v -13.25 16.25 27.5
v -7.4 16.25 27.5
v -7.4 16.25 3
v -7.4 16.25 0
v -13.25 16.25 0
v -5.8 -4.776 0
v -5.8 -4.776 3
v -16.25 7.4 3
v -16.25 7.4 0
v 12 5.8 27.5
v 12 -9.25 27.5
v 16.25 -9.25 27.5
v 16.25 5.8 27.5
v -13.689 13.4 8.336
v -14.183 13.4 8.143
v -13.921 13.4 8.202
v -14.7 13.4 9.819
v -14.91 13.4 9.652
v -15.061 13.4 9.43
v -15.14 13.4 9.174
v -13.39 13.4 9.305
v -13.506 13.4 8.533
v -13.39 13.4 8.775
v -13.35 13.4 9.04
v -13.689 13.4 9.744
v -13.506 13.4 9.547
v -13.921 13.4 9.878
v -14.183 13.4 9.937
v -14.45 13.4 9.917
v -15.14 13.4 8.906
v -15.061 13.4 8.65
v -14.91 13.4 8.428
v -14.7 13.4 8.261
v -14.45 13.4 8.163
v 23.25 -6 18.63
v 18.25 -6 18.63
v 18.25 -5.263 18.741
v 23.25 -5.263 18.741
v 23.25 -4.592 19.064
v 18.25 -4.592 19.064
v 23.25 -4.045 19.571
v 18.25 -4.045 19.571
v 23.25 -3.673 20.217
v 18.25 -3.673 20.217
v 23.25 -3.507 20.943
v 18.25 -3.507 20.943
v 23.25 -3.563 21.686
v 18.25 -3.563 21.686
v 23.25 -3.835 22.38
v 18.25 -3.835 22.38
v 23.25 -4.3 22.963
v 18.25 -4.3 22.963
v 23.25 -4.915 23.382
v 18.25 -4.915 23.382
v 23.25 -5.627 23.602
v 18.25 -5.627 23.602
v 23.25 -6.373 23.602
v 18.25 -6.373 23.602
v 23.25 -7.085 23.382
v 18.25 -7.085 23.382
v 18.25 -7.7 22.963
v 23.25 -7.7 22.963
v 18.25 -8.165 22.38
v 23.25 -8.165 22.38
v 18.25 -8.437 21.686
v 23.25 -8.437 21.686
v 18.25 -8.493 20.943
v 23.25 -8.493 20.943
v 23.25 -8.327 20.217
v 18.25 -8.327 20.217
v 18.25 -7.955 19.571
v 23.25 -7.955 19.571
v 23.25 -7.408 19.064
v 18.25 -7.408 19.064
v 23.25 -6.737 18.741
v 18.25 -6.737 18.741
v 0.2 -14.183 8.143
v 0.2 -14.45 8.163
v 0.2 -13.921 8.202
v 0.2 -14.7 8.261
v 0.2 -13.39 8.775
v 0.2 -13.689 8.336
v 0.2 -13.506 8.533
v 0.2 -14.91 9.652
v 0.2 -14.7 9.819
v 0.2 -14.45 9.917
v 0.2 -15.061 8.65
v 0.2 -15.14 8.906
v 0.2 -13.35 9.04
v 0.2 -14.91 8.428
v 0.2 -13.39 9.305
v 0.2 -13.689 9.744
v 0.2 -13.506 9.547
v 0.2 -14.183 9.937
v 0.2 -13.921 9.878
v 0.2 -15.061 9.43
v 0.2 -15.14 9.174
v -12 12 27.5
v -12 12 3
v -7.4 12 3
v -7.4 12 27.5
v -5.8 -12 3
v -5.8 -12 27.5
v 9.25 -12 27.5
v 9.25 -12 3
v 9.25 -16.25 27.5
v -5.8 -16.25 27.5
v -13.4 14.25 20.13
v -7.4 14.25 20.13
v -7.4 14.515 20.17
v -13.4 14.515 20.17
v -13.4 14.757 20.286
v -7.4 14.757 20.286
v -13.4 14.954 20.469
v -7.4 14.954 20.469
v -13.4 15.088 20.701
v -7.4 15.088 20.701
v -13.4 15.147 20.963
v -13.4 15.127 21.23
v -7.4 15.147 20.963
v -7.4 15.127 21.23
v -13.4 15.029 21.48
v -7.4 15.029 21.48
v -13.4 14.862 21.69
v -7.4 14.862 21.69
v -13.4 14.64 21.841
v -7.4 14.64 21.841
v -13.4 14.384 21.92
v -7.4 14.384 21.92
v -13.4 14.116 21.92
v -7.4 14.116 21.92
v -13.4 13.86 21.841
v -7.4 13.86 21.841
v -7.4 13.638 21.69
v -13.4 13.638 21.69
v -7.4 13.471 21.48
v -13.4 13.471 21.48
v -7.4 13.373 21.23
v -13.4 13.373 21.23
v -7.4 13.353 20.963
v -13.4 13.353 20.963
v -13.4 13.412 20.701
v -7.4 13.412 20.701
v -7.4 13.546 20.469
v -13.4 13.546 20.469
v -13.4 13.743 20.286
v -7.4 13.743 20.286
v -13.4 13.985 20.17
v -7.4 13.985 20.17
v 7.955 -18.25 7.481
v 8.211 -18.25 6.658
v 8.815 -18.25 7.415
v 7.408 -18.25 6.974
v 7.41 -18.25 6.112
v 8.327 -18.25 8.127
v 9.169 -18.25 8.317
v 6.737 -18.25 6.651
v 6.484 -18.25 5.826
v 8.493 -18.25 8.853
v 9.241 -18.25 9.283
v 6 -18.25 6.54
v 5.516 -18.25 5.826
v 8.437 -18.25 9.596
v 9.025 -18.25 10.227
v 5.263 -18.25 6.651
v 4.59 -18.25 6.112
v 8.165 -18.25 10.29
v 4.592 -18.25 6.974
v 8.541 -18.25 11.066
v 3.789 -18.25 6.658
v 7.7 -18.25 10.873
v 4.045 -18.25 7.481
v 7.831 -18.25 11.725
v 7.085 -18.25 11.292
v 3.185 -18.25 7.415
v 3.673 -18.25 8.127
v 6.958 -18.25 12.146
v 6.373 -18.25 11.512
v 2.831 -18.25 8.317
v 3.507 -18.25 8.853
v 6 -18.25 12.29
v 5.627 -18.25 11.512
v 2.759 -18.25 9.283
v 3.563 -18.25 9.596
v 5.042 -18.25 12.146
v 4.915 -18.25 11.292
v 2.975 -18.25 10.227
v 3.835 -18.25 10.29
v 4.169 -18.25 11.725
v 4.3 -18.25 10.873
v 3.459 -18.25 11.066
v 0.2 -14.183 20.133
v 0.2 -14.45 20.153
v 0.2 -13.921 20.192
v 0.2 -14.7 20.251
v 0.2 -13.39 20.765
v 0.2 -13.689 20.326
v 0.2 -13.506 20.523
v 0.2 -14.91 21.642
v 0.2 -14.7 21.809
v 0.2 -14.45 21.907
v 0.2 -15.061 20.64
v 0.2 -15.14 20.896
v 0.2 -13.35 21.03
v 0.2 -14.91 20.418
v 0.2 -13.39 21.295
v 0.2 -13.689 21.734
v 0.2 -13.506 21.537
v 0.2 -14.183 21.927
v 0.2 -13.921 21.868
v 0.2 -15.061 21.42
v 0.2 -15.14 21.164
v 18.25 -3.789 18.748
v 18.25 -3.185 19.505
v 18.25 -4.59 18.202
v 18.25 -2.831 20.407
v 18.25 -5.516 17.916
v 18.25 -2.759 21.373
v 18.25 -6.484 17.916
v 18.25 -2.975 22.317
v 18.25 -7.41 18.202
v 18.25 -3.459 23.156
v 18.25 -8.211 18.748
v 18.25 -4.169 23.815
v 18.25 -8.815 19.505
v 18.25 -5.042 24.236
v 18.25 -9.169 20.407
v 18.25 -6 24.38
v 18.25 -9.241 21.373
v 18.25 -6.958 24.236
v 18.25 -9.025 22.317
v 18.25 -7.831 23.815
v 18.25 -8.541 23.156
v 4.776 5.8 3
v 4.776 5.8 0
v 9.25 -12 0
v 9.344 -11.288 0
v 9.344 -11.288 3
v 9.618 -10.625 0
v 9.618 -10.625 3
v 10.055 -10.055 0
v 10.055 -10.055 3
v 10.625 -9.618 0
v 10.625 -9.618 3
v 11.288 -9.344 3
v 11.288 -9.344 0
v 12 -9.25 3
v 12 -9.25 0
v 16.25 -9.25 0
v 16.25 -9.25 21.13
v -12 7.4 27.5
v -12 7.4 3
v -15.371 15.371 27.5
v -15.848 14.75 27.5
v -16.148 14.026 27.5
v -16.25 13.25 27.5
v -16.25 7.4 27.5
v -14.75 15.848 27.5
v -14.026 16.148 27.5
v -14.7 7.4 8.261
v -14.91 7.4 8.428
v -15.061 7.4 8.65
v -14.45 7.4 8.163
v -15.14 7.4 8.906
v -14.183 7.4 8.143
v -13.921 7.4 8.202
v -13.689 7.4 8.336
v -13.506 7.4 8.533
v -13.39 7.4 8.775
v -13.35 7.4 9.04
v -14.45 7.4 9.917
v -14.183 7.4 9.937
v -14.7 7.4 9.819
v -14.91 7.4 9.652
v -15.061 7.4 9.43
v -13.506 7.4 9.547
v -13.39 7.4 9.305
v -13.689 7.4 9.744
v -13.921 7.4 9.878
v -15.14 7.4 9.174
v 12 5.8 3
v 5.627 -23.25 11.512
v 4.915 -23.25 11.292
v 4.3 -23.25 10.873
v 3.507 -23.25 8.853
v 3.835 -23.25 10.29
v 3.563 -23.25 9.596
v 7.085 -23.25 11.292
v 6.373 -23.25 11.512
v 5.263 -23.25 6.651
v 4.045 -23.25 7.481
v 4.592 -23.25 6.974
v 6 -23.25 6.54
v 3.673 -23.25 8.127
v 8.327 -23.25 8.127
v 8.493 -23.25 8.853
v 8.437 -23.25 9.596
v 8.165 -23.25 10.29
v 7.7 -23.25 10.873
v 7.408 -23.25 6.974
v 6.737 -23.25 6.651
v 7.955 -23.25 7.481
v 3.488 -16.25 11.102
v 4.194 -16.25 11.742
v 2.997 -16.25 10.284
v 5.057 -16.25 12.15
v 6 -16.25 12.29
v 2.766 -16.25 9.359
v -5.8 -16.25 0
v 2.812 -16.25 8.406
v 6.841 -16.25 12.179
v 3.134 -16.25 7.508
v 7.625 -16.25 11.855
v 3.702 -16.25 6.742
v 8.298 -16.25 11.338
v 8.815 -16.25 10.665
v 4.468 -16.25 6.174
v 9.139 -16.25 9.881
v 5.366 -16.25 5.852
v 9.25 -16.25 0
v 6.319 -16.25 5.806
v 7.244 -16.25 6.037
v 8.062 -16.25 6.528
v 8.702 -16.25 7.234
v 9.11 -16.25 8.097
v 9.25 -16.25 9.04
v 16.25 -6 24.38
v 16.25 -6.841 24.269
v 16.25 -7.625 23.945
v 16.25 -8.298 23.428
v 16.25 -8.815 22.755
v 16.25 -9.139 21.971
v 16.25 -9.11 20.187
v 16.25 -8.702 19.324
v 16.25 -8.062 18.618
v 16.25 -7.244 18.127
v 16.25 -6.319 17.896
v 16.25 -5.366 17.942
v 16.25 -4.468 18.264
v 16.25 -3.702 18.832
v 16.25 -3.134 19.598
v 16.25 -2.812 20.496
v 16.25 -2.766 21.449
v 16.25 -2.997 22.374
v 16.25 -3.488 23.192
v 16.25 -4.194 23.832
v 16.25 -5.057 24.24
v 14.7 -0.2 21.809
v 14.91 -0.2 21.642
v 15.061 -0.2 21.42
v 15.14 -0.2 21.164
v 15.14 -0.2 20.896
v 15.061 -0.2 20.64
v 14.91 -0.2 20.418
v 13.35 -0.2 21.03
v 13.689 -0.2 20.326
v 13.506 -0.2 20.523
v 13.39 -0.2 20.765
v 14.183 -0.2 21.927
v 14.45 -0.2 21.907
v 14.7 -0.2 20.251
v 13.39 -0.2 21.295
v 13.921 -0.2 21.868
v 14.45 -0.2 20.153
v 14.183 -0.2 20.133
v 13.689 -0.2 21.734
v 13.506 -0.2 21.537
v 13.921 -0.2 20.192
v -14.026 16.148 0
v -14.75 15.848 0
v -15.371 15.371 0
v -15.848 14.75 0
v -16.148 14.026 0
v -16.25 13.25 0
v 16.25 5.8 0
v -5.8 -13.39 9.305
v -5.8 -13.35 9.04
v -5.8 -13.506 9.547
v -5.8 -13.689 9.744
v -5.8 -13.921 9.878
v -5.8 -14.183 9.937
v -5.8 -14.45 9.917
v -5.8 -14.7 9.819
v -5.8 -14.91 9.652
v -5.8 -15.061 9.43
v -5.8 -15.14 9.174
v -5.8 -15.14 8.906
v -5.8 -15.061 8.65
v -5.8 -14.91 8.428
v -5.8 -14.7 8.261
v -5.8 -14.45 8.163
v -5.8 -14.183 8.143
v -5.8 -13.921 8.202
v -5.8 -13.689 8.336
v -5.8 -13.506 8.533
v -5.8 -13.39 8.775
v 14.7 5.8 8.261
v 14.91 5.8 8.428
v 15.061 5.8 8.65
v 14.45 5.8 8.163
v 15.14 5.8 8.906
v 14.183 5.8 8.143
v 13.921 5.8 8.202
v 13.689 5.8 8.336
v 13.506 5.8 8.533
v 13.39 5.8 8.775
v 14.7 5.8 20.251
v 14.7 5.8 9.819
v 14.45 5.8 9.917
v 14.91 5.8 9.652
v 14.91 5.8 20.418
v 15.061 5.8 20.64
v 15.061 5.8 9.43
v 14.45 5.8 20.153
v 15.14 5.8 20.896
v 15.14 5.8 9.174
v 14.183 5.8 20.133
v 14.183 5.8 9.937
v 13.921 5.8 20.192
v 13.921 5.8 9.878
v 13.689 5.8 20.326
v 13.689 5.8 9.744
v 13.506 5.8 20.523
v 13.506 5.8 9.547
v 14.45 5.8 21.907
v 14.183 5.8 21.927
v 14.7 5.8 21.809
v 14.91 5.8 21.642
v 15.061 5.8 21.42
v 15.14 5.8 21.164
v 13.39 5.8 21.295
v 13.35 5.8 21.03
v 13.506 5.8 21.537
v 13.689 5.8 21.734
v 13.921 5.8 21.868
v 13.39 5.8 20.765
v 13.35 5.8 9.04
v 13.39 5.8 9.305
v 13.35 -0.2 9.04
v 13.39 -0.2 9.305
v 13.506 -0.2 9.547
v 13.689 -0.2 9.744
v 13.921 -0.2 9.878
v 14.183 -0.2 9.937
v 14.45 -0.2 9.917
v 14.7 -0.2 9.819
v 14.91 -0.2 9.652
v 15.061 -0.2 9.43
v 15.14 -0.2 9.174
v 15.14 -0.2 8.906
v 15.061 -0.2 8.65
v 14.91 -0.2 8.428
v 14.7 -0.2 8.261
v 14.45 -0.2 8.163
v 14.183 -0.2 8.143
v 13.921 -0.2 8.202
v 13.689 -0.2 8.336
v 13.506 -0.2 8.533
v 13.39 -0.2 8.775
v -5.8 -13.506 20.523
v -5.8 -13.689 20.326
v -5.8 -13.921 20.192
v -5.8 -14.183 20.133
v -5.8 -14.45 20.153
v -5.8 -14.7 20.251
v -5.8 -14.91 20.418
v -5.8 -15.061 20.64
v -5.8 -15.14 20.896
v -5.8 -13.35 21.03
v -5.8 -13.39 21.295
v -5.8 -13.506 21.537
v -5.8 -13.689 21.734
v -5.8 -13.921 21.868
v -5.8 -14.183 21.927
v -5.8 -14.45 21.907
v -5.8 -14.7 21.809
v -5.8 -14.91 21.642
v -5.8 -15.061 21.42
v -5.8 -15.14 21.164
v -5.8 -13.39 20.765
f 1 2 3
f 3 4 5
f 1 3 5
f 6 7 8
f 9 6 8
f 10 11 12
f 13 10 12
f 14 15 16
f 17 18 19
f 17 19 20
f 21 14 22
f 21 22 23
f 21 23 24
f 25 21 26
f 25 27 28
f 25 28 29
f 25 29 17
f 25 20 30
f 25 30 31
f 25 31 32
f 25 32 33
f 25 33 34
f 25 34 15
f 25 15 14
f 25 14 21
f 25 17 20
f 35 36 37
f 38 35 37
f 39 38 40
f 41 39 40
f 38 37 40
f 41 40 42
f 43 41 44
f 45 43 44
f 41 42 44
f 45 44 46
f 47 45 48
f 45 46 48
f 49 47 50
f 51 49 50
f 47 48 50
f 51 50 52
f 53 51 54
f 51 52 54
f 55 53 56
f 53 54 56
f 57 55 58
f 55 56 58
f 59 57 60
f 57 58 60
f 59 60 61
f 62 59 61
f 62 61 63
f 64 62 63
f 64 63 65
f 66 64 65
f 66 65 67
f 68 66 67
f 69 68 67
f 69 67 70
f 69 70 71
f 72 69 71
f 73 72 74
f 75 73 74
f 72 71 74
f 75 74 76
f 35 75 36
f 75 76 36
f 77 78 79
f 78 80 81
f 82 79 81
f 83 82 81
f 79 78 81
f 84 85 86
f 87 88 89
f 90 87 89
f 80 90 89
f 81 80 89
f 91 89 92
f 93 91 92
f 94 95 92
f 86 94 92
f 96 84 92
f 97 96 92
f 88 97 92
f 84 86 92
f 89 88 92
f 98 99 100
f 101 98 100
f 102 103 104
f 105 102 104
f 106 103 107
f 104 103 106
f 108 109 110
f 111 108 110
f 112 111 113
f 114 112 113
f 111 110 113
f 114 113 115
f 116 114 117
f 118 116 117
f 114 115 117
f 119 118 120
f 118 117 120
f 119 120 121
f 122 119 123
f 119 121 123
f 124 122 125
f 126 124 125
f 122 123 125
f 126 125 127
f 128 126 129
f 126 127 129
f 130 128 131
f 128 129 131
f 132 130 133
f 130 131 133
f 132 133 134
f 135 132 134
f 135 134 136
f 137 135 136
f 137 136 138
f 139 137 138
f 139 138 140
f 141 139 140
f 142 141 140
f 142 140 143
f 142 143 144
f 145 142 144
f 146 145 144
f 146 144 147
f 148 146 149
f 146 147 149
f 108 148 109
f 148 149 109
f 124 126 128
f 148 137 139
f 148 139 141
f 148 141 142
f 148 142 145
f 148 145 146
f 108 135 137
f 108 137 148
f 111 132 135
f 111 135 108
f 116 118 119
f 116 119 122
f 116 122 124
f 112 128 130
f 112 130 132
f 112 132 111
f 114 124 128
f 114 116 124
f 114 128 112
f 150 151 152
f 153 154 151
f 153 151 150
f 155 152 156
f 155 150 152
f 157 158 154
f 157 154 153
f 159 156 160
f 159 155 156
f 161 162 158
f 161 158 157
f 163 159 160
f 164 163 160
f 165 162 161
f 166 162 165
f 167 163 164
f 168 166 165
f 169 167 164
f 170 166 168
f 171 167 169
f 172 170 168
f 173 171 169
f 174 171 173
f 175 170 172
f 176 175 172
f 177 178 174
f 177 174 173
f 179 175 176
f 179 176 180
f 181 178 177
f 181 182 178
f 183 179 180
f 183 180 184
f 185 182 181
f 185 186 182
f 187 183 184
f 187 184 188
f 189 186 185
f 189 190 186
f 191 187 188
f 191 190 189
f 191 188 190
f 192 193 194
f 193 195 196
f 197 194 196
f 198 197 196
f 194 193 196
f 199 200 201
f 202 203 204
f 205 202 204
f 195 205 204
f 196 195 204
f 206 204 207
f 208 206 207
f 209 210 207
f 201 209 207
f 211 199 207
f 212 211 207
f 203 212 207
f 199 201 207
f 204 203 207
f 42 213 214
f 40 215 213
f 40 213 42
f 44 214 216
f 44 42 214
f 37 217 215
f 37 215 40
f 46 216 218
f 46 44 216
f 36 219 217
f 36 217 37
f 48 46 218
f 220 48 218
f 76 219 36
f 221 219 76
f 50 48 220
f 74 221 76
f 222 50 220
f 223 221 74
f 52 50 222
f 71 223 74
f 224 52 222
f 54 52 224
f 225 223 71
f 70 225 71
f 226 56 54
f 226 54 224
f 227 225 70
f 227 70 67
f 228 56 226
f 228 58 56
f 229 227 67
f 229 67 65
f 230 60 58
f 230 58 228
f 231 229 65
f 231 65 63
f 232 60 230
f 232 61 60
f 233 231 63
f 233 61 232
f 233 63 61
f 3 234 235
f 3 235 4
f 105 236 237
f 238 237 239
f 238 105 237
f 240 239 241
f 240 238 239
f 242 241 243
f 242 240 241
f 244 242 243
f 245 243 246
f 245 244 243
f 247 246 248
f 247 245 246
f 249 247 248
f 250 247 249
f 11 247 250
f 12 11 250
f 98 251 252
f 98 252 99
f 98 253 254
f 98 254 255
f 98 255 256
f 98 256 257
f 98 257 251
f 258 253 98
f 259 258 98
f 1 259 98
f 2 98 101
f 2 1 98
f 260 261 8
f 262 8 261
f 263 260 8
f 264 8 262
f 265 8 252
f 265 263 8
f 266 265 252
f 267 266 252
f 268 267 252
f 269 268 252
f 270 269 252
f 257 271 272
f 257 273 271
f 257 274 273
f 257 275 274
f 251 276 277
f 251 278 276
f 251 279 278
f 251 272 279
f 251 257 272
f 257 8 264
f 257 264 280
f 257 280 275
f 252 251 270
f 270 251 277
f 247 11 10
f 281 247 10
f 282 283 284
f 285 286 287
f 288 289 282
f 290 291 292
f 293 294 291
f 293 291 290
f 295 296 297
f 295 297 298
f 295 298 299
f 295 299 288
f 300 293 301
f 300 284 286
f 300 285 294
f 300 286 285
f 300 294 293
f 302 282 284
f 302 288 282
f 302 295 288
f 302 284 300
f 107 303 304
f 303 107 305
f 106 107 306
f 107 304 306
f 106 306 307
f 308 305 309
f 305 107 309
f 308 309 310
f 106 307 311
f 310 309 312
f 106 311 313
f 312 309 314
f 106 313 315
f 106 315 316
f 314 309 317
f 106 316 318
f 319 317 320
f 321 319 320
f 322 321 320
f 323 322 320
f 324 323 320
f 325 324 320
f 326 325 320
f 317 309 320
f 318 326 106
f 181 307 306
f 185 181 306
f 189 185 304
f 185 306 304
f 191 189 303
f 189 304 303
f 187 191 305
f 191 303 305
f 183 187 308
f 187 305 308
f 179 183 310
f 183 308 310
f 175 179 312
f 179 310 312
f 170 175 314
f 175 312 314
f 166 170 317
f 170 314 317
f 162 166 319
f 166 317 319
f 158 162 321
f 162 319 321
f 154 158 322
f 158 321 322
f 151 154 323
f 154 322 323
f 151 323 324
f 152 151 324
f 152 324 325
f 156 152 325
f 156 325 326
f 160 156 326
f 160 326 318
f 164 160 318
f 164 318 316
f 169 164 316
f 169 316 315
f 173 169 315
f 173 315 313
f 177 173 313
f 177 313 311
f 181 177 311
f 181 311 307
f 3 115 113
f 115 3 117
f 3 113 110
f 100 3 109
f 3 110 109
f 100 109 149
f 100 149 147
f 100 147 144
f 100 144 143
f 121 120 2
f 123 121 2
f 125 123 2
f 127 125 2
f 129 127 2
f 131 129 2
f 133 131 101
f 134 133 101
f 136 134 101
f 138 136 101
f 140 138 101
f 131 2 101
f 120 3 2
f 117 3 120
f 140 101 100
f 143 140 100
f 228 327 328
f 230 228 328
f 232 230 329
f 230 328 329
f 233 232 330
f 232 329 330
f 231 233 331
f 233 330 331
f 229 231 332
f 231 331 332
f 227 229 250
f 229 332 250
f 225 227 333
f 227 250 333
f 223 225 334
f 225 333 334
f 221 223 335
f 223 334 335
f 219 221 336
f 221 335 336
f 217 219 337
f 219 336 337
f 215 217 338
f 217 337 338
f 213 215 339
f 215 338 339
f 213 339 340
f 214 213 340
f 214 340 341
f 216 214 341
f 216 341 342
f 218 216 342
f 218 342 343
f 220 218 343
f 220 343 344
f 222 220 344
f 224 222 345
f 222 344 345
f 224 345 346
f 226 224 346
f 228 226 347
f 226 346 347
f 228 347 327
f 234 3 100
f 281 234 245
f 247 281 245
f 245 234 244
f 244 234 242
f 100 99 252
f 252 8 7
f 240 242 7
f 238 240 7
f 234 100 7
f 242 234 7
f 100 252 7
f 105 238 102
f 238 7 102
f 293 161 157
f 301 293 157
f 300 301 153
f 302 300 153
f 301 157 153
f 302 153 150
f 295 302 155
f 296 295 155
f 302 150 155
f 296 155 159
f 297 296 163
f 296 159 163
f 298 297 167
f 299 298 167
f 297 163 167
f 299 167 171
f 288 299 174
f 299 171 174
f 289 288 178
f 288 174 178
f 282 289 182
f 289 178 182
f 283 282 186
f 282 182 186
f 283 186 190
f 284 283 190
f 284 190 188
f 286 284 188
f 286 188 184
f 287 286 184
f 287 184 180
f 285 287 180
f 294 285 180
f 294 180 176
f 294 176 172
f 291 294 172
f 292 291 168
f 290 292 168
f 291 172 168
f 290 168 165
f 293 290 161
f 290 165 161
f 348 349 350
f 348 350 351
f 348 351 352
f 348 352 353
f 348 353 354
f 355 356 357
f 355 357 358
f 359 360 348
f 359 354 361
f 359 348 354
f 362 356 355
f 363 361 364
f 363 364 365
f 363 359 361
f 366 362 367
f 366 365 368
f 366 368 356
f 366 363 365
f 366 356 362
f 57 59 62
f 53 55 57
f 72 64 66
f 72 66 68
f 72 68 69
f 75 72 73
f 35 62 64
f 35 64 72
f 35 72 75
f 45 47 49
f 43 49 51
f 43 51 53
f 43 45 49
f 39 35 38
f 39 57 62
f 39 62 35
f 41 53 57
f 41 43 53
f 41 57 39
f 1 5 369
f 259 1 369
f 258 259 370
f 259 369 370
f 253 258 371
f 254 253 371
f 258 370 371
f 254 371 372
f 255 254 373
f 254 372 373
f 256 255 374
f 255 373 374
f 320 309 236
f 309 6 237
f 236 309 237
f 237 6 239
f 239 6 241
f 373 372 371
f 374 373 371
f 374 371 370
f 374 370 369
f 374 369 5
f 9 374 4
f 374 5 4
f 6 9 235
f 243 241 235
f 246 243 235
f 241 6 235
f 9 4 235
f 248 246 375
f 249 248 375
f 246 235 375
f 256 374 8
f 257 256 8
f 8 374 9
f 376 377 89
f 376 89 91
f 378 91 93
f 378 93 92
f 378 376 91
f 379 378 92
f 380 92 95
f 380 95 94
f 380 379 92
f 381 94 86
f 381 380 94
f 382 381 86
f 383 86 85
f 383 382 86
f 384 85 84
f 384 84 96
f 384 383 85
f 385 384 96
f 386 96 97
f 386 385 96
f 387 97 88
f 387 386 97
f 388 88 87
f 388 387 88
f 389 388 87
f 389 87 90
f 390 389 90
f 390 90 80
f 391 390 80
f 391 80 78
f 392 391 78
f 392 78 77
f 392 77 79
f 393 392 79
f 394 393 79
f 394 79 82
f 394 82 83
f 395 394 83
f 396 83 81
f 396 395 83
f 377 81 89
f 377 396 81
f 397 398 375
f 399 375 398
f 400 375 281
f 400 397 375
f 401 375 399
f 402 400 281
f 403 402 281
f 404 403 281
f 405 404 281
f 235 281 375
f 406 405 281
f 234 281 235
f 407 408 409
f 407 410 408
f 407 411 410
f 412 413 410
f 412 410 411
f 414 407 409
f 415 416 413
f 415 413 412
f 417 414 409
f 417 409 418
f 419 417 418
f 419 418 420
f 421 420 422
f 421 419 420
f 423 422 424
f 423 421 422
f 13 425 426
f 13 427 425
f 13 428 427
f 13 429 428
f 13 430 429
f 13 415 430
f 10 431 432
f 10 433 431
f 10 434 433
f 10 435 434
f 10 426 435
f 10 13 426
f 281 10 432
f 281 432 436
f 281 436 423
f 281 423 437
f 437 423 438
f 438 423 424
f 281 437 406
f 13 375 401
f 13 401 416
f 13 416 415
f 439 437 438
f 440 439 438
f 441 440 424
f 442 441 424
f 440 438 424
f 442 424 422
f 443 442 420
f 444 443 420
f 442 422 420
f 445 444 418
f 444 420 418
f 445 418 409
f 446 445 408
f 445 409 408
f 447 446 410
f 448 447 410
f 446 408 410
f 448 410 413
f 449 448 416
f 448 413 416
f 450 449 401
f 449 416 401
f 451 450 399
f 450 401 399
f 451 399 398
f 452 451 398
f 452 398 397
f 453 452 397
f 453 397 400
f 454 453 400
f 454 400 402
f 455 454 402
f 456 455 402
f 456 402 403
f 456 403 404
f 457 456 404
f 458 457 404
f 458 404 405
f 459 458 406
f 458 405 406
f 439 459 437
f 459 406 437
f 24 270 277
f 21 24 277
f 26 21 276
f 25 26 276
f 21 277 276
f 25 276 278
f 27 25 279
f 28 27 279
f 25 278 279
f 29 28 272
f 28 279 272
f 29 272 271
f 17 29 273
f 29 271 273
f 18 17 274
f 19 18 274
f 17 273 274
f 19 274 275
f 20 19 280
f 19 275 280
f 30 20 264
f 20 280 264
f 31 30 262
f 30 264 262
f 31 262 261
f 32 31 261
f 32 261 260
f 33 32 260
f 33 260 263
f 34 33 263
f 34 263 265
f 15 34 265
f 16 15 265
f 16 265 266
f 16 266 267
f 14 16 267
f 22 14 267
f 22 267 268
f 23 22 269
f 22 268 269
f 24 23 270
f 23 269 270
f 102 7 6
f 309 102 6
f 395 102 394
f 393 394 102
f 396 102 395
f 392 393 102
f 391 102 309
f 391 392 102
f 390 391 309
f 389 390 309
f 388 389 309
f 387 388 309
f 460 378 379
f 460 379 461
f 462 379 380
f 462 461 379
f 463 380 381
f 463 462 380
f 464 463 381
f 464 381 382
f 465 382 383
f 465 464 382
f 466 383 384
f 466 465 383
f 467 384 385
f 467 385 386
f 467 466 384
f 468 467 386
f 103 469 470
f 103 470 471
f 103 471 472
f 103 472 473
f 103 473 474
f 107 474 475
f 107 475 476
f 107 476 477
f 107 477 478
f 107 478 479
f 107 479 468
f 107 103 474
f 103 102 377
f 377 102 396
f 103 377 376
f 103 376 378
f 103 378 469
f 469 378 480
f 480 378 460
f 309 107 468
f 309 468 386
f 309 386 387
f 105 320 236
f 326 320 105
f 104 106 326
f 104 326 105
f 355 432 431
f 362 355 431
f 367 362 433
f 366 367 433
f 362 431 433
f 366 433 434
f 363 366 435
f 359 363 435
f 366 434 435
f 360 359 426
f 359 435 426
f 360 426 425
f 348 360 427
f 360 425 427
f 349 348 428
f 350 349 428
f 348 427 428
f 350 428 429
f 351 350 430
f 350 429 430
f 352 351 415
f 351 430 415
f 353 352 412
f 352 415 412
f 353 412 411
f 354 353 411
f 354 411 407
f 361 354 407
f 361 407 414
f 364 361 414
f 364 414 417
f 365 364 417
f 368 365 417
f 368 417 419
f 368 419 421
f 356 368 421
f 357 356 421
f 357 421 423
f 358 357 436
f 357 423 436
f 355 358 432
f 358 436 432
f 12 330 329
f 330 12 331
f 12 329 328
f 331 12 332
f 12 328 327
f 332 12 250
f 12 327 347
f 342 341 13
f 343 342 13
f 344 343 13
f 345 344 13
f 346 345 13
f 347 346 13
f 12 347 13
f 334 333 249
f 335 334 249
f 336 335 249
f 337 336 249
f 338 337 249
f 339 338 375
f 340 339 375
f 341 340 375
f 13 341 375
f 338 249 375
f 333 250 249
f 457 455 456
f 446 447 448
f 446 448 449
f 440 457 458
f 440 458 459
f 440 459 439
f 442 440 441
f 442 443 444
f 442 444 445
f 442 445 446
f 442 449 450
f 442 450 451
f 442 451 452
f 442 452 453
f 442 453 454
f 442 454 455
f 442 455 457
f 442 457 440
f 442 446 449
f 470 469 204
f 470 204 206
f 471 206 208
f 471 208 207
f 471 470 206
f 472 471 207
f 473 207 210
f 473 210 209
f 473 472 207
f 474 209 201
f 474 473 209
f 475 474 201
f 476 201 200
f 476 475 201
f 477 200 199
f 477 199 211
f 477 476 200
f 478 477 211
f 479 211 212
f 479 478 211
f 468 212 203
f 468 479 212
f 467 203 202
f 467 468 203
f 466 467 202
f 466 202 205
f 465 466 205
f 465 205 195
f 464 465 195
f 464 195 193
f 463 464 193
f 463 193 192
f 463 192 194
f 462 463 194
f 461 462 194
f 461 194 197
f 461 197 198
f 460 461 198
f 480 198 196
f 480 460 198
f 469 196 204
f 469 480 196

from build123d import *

# Parameters (mm, degrees)
EXTRUDE_1_DEPTH      = 27.5
SKETCH_3_W           = 24
SKETCH_3_H           = 24
CUT_EXTRUDE_3_DEPTH  = 24.5
CUT_EXTRUDE_4_DEPTH  = 24.5
SKETCH_7_R           = 3.25
EXTRUDE_4_DEPTH      = 2
SKETCH_10_R          = 3.25
EXTRUDE_5_DEPTH      = 2
CUT_EXTRUDE_6_DEPTH  = 27.5
CUT_EXTRUDE_7_DEPTH  = 3
SKETCH_16_R          = 0.9
CUT_EXTRUDE_10_DEPTH = 6
SKETCH_20_R          = 2.5
EXTRUDE_6_DEPTH      = 5
SKETCH_25_R          = 2.5
EXTRUDE_7_DEPTH      = 5
SKETCH_27_R          = 0.9
CUT_EXTRUDE_13_DEPTH = 6
SKETCH_26_R          = 0.9
CUT_EXTRUDE_14_DEPTH = 6


with BuildPart() as part:
    # 草图1 → 凸台-拉伸1 (new body)
    with BuildSketch(Plane.XY):
        with BuildLine():
            Line((-16.25, -16.25), (16.25, -16.25))
            Line((16.25, -16.25), (16.25, 16.25))
            Line((16.25, 16.25), (-13.25, 16.25))
            ThreePointArc((-13.25, 16.25), (-15.371320344, 15.371320344), (-16.25, 13.25))
            Line((-16.25, 13.25), (-16.25, -16.25))
        make_face()
    extrude(amount=EXTRUDE_1_DEPTH)

    # 草图3 → 切除-拉伸3 (cut)
    with BuildSketch(Plane.XY.offset(27.5)):
        Rectangle(SKETCH_3_W, SKETCH_3_H)
    extrude(amount=-CUT_EXTRUDE_3_DEPTH, mode=Mode.SUBTRACT)

    # 草图4 → 切除-拉伸4 (cut)
    with BuildSketch(Plane.XY.offset(27.5)):
        Polygon((16.25, 16.25), (-7.4, 16.25), (-7.4, 12), (-0.175, 5.8), (16.25, 5.8), align=None)
    cut_extrude_4 = extrude(amount=-CUT_EXTRUDE_4_DEPTH, mode=Mode.SUBTRACT)

    # 镜向1: 切除-拉伸4 across plane
    add(cut_extrude_4.mirror(Plane(origin=(0, 0, 0), x_dir=(0, 0, 1), z_dir=(0.7071067811865477, 0.7071067811865475, 0))), mode=Mode.SUBTRACT)

    # 草图7 → 凸台-拉伸4 (add)
    with BuildSketch(Plane.XZ.offset(16.25)):
        with Locations(Location((6, 9.04, 0), (0, 0, 90))):
            Circle(SKETCH_7_R)
    extrude(amount=EXTRUDE_4_DEPTH)

    # 草图10 → 凸台-拉伸5 (add)
    with BuildSketch(Plane(origin=(16.25, 0, 0), x_dir=(0, 0, -1), z_dir=(1, 0, 0))):
        with Locations(Location((-21.13, -6, 0), (0, 0, 180))):
            Circle(SKETCH_10_R)
    extrude(amount=EXTRUDE_5_DEPTH)

    # 草图13 → 切除-拉伸6 (cut)
    with BuildSketch(Plane.XY.offset(27.5)):
        with BuildLine():
            Line((16.25, -16.25), (9.25, -16.25))
            Line((9.25, -16.25), (9.25, -12))
            ThreePointArc((9.25, -12), (10.055456352, -10.055456352), (12, -9.25))
            Line((12, -9.25), (16.25, -9.25))
            Line((16.25, -9.25), (16.25, -16.25))
        make_face()
    extrude(amount=-CUT_EXTRUDE_6_DEPTH, mode=Mode.SUBTRACT)

    # 草图14 → 切除-拉伸7 (cut)
    with BuildSketch(Plane.XY.offset(3)):
        Polygon((16.25, 5.8), (4.775755008, 5.8), (-7.4, 16.25), (16.25, 16.25), align=None)
    cut_extrude_7 = extrude(amount=-CUT_EXTRUDE_7_DEPTH, mode=Mode.SUBTRACT)

    # 镜向3: 切除-拉伸7 across plane
    add(cut_extrude_7.mirror(Plane(origin=(0, 0, 0), x_dir=(0, 0, 1), z_dir=(0.7071067811865477, 0.7071067811865475, 0))), mode=Mode.SUBTRACT)

    # 草图16 → 切除-拉伸10 (cut)
    with BuildSketch(Plane(origin=(0, 5.8, 0), x_dir=(1, 0, 0), z_dir=(0, 1, 0))):
        with Locations(Location((14.25, -9.04, 0), (0, 0, 180))):
            Circle(SKETCH_16_R)
        with Locations(Location((14.25, -21.03, 0), (0, 0, 180))):
            Circle(SKETCH_16_R)
    cut_extrude_10 = extrude(amount=-CUT_EXTRUDE_10_DEPTH, mode=Mode.SUBTRACT)

    # 镜向4: 切除-拉伸10 across plane
    add(cut_extrude_10.mirror(Plane(origin=(0, 0, 0), x_dir=(0, 0, 1), z_dir=(0.7071067811865477, 0.7071067811865475, 0))), mode=Mode.SUBTRACT)

    # 草图20 → 凸台-拉伸6 (add)
    with BuildSketch(Plane(origin=(18.25, 0, 0), x_dir=(0, 0, -1), z_dir=(1, 0, 0))):
        with Locations((-21.13, -6)):
            Circle(SKETCH_20_R)
    extrude(amount=EXTRUDE_6_DEPTH)

    # 草图25 → 凸台-拉伸7 (add)
    with BuildSketch(Plane.XZ.offset(18.25)):
        with Locations(Location((6, 9.04, 0), (0, 0, 270))):
            Circle(SKETCH_25_R)
    extrude(amount=EXTRUDE_7_DEPTH)

    # 草图27 → 切除-拉伸13 (cut)
    with BuildSketch(Plane(origin=(-7.4, 0, 0), x_dir=(0, 0, -1), z_dir=(1, 0, 0))):
        with Locations((-21.03, 14.25)):
            Circle(SKETCH_27_R)
    extrude(amount=-CUT_EXTRUDE_13_DEPTH, mode=Mode.SUBTRACT)

    # 草图26 → 切除-拉伸14 (cut)
    with BuildSketch(Plane(origin=(0, 7.4, 0), x_dir=(-1, 0, 0), z_dir=(0, -1, 0))):
        with Locations(Location((14.25, -9.04, 0), (0, 0, 180))):
            Circle(SKETCH_26_R)
    extrude(amount=-CUT_EXTRUDE_14_DEPTH, mode=Mode.SUBTRACT)


solid = part.part
